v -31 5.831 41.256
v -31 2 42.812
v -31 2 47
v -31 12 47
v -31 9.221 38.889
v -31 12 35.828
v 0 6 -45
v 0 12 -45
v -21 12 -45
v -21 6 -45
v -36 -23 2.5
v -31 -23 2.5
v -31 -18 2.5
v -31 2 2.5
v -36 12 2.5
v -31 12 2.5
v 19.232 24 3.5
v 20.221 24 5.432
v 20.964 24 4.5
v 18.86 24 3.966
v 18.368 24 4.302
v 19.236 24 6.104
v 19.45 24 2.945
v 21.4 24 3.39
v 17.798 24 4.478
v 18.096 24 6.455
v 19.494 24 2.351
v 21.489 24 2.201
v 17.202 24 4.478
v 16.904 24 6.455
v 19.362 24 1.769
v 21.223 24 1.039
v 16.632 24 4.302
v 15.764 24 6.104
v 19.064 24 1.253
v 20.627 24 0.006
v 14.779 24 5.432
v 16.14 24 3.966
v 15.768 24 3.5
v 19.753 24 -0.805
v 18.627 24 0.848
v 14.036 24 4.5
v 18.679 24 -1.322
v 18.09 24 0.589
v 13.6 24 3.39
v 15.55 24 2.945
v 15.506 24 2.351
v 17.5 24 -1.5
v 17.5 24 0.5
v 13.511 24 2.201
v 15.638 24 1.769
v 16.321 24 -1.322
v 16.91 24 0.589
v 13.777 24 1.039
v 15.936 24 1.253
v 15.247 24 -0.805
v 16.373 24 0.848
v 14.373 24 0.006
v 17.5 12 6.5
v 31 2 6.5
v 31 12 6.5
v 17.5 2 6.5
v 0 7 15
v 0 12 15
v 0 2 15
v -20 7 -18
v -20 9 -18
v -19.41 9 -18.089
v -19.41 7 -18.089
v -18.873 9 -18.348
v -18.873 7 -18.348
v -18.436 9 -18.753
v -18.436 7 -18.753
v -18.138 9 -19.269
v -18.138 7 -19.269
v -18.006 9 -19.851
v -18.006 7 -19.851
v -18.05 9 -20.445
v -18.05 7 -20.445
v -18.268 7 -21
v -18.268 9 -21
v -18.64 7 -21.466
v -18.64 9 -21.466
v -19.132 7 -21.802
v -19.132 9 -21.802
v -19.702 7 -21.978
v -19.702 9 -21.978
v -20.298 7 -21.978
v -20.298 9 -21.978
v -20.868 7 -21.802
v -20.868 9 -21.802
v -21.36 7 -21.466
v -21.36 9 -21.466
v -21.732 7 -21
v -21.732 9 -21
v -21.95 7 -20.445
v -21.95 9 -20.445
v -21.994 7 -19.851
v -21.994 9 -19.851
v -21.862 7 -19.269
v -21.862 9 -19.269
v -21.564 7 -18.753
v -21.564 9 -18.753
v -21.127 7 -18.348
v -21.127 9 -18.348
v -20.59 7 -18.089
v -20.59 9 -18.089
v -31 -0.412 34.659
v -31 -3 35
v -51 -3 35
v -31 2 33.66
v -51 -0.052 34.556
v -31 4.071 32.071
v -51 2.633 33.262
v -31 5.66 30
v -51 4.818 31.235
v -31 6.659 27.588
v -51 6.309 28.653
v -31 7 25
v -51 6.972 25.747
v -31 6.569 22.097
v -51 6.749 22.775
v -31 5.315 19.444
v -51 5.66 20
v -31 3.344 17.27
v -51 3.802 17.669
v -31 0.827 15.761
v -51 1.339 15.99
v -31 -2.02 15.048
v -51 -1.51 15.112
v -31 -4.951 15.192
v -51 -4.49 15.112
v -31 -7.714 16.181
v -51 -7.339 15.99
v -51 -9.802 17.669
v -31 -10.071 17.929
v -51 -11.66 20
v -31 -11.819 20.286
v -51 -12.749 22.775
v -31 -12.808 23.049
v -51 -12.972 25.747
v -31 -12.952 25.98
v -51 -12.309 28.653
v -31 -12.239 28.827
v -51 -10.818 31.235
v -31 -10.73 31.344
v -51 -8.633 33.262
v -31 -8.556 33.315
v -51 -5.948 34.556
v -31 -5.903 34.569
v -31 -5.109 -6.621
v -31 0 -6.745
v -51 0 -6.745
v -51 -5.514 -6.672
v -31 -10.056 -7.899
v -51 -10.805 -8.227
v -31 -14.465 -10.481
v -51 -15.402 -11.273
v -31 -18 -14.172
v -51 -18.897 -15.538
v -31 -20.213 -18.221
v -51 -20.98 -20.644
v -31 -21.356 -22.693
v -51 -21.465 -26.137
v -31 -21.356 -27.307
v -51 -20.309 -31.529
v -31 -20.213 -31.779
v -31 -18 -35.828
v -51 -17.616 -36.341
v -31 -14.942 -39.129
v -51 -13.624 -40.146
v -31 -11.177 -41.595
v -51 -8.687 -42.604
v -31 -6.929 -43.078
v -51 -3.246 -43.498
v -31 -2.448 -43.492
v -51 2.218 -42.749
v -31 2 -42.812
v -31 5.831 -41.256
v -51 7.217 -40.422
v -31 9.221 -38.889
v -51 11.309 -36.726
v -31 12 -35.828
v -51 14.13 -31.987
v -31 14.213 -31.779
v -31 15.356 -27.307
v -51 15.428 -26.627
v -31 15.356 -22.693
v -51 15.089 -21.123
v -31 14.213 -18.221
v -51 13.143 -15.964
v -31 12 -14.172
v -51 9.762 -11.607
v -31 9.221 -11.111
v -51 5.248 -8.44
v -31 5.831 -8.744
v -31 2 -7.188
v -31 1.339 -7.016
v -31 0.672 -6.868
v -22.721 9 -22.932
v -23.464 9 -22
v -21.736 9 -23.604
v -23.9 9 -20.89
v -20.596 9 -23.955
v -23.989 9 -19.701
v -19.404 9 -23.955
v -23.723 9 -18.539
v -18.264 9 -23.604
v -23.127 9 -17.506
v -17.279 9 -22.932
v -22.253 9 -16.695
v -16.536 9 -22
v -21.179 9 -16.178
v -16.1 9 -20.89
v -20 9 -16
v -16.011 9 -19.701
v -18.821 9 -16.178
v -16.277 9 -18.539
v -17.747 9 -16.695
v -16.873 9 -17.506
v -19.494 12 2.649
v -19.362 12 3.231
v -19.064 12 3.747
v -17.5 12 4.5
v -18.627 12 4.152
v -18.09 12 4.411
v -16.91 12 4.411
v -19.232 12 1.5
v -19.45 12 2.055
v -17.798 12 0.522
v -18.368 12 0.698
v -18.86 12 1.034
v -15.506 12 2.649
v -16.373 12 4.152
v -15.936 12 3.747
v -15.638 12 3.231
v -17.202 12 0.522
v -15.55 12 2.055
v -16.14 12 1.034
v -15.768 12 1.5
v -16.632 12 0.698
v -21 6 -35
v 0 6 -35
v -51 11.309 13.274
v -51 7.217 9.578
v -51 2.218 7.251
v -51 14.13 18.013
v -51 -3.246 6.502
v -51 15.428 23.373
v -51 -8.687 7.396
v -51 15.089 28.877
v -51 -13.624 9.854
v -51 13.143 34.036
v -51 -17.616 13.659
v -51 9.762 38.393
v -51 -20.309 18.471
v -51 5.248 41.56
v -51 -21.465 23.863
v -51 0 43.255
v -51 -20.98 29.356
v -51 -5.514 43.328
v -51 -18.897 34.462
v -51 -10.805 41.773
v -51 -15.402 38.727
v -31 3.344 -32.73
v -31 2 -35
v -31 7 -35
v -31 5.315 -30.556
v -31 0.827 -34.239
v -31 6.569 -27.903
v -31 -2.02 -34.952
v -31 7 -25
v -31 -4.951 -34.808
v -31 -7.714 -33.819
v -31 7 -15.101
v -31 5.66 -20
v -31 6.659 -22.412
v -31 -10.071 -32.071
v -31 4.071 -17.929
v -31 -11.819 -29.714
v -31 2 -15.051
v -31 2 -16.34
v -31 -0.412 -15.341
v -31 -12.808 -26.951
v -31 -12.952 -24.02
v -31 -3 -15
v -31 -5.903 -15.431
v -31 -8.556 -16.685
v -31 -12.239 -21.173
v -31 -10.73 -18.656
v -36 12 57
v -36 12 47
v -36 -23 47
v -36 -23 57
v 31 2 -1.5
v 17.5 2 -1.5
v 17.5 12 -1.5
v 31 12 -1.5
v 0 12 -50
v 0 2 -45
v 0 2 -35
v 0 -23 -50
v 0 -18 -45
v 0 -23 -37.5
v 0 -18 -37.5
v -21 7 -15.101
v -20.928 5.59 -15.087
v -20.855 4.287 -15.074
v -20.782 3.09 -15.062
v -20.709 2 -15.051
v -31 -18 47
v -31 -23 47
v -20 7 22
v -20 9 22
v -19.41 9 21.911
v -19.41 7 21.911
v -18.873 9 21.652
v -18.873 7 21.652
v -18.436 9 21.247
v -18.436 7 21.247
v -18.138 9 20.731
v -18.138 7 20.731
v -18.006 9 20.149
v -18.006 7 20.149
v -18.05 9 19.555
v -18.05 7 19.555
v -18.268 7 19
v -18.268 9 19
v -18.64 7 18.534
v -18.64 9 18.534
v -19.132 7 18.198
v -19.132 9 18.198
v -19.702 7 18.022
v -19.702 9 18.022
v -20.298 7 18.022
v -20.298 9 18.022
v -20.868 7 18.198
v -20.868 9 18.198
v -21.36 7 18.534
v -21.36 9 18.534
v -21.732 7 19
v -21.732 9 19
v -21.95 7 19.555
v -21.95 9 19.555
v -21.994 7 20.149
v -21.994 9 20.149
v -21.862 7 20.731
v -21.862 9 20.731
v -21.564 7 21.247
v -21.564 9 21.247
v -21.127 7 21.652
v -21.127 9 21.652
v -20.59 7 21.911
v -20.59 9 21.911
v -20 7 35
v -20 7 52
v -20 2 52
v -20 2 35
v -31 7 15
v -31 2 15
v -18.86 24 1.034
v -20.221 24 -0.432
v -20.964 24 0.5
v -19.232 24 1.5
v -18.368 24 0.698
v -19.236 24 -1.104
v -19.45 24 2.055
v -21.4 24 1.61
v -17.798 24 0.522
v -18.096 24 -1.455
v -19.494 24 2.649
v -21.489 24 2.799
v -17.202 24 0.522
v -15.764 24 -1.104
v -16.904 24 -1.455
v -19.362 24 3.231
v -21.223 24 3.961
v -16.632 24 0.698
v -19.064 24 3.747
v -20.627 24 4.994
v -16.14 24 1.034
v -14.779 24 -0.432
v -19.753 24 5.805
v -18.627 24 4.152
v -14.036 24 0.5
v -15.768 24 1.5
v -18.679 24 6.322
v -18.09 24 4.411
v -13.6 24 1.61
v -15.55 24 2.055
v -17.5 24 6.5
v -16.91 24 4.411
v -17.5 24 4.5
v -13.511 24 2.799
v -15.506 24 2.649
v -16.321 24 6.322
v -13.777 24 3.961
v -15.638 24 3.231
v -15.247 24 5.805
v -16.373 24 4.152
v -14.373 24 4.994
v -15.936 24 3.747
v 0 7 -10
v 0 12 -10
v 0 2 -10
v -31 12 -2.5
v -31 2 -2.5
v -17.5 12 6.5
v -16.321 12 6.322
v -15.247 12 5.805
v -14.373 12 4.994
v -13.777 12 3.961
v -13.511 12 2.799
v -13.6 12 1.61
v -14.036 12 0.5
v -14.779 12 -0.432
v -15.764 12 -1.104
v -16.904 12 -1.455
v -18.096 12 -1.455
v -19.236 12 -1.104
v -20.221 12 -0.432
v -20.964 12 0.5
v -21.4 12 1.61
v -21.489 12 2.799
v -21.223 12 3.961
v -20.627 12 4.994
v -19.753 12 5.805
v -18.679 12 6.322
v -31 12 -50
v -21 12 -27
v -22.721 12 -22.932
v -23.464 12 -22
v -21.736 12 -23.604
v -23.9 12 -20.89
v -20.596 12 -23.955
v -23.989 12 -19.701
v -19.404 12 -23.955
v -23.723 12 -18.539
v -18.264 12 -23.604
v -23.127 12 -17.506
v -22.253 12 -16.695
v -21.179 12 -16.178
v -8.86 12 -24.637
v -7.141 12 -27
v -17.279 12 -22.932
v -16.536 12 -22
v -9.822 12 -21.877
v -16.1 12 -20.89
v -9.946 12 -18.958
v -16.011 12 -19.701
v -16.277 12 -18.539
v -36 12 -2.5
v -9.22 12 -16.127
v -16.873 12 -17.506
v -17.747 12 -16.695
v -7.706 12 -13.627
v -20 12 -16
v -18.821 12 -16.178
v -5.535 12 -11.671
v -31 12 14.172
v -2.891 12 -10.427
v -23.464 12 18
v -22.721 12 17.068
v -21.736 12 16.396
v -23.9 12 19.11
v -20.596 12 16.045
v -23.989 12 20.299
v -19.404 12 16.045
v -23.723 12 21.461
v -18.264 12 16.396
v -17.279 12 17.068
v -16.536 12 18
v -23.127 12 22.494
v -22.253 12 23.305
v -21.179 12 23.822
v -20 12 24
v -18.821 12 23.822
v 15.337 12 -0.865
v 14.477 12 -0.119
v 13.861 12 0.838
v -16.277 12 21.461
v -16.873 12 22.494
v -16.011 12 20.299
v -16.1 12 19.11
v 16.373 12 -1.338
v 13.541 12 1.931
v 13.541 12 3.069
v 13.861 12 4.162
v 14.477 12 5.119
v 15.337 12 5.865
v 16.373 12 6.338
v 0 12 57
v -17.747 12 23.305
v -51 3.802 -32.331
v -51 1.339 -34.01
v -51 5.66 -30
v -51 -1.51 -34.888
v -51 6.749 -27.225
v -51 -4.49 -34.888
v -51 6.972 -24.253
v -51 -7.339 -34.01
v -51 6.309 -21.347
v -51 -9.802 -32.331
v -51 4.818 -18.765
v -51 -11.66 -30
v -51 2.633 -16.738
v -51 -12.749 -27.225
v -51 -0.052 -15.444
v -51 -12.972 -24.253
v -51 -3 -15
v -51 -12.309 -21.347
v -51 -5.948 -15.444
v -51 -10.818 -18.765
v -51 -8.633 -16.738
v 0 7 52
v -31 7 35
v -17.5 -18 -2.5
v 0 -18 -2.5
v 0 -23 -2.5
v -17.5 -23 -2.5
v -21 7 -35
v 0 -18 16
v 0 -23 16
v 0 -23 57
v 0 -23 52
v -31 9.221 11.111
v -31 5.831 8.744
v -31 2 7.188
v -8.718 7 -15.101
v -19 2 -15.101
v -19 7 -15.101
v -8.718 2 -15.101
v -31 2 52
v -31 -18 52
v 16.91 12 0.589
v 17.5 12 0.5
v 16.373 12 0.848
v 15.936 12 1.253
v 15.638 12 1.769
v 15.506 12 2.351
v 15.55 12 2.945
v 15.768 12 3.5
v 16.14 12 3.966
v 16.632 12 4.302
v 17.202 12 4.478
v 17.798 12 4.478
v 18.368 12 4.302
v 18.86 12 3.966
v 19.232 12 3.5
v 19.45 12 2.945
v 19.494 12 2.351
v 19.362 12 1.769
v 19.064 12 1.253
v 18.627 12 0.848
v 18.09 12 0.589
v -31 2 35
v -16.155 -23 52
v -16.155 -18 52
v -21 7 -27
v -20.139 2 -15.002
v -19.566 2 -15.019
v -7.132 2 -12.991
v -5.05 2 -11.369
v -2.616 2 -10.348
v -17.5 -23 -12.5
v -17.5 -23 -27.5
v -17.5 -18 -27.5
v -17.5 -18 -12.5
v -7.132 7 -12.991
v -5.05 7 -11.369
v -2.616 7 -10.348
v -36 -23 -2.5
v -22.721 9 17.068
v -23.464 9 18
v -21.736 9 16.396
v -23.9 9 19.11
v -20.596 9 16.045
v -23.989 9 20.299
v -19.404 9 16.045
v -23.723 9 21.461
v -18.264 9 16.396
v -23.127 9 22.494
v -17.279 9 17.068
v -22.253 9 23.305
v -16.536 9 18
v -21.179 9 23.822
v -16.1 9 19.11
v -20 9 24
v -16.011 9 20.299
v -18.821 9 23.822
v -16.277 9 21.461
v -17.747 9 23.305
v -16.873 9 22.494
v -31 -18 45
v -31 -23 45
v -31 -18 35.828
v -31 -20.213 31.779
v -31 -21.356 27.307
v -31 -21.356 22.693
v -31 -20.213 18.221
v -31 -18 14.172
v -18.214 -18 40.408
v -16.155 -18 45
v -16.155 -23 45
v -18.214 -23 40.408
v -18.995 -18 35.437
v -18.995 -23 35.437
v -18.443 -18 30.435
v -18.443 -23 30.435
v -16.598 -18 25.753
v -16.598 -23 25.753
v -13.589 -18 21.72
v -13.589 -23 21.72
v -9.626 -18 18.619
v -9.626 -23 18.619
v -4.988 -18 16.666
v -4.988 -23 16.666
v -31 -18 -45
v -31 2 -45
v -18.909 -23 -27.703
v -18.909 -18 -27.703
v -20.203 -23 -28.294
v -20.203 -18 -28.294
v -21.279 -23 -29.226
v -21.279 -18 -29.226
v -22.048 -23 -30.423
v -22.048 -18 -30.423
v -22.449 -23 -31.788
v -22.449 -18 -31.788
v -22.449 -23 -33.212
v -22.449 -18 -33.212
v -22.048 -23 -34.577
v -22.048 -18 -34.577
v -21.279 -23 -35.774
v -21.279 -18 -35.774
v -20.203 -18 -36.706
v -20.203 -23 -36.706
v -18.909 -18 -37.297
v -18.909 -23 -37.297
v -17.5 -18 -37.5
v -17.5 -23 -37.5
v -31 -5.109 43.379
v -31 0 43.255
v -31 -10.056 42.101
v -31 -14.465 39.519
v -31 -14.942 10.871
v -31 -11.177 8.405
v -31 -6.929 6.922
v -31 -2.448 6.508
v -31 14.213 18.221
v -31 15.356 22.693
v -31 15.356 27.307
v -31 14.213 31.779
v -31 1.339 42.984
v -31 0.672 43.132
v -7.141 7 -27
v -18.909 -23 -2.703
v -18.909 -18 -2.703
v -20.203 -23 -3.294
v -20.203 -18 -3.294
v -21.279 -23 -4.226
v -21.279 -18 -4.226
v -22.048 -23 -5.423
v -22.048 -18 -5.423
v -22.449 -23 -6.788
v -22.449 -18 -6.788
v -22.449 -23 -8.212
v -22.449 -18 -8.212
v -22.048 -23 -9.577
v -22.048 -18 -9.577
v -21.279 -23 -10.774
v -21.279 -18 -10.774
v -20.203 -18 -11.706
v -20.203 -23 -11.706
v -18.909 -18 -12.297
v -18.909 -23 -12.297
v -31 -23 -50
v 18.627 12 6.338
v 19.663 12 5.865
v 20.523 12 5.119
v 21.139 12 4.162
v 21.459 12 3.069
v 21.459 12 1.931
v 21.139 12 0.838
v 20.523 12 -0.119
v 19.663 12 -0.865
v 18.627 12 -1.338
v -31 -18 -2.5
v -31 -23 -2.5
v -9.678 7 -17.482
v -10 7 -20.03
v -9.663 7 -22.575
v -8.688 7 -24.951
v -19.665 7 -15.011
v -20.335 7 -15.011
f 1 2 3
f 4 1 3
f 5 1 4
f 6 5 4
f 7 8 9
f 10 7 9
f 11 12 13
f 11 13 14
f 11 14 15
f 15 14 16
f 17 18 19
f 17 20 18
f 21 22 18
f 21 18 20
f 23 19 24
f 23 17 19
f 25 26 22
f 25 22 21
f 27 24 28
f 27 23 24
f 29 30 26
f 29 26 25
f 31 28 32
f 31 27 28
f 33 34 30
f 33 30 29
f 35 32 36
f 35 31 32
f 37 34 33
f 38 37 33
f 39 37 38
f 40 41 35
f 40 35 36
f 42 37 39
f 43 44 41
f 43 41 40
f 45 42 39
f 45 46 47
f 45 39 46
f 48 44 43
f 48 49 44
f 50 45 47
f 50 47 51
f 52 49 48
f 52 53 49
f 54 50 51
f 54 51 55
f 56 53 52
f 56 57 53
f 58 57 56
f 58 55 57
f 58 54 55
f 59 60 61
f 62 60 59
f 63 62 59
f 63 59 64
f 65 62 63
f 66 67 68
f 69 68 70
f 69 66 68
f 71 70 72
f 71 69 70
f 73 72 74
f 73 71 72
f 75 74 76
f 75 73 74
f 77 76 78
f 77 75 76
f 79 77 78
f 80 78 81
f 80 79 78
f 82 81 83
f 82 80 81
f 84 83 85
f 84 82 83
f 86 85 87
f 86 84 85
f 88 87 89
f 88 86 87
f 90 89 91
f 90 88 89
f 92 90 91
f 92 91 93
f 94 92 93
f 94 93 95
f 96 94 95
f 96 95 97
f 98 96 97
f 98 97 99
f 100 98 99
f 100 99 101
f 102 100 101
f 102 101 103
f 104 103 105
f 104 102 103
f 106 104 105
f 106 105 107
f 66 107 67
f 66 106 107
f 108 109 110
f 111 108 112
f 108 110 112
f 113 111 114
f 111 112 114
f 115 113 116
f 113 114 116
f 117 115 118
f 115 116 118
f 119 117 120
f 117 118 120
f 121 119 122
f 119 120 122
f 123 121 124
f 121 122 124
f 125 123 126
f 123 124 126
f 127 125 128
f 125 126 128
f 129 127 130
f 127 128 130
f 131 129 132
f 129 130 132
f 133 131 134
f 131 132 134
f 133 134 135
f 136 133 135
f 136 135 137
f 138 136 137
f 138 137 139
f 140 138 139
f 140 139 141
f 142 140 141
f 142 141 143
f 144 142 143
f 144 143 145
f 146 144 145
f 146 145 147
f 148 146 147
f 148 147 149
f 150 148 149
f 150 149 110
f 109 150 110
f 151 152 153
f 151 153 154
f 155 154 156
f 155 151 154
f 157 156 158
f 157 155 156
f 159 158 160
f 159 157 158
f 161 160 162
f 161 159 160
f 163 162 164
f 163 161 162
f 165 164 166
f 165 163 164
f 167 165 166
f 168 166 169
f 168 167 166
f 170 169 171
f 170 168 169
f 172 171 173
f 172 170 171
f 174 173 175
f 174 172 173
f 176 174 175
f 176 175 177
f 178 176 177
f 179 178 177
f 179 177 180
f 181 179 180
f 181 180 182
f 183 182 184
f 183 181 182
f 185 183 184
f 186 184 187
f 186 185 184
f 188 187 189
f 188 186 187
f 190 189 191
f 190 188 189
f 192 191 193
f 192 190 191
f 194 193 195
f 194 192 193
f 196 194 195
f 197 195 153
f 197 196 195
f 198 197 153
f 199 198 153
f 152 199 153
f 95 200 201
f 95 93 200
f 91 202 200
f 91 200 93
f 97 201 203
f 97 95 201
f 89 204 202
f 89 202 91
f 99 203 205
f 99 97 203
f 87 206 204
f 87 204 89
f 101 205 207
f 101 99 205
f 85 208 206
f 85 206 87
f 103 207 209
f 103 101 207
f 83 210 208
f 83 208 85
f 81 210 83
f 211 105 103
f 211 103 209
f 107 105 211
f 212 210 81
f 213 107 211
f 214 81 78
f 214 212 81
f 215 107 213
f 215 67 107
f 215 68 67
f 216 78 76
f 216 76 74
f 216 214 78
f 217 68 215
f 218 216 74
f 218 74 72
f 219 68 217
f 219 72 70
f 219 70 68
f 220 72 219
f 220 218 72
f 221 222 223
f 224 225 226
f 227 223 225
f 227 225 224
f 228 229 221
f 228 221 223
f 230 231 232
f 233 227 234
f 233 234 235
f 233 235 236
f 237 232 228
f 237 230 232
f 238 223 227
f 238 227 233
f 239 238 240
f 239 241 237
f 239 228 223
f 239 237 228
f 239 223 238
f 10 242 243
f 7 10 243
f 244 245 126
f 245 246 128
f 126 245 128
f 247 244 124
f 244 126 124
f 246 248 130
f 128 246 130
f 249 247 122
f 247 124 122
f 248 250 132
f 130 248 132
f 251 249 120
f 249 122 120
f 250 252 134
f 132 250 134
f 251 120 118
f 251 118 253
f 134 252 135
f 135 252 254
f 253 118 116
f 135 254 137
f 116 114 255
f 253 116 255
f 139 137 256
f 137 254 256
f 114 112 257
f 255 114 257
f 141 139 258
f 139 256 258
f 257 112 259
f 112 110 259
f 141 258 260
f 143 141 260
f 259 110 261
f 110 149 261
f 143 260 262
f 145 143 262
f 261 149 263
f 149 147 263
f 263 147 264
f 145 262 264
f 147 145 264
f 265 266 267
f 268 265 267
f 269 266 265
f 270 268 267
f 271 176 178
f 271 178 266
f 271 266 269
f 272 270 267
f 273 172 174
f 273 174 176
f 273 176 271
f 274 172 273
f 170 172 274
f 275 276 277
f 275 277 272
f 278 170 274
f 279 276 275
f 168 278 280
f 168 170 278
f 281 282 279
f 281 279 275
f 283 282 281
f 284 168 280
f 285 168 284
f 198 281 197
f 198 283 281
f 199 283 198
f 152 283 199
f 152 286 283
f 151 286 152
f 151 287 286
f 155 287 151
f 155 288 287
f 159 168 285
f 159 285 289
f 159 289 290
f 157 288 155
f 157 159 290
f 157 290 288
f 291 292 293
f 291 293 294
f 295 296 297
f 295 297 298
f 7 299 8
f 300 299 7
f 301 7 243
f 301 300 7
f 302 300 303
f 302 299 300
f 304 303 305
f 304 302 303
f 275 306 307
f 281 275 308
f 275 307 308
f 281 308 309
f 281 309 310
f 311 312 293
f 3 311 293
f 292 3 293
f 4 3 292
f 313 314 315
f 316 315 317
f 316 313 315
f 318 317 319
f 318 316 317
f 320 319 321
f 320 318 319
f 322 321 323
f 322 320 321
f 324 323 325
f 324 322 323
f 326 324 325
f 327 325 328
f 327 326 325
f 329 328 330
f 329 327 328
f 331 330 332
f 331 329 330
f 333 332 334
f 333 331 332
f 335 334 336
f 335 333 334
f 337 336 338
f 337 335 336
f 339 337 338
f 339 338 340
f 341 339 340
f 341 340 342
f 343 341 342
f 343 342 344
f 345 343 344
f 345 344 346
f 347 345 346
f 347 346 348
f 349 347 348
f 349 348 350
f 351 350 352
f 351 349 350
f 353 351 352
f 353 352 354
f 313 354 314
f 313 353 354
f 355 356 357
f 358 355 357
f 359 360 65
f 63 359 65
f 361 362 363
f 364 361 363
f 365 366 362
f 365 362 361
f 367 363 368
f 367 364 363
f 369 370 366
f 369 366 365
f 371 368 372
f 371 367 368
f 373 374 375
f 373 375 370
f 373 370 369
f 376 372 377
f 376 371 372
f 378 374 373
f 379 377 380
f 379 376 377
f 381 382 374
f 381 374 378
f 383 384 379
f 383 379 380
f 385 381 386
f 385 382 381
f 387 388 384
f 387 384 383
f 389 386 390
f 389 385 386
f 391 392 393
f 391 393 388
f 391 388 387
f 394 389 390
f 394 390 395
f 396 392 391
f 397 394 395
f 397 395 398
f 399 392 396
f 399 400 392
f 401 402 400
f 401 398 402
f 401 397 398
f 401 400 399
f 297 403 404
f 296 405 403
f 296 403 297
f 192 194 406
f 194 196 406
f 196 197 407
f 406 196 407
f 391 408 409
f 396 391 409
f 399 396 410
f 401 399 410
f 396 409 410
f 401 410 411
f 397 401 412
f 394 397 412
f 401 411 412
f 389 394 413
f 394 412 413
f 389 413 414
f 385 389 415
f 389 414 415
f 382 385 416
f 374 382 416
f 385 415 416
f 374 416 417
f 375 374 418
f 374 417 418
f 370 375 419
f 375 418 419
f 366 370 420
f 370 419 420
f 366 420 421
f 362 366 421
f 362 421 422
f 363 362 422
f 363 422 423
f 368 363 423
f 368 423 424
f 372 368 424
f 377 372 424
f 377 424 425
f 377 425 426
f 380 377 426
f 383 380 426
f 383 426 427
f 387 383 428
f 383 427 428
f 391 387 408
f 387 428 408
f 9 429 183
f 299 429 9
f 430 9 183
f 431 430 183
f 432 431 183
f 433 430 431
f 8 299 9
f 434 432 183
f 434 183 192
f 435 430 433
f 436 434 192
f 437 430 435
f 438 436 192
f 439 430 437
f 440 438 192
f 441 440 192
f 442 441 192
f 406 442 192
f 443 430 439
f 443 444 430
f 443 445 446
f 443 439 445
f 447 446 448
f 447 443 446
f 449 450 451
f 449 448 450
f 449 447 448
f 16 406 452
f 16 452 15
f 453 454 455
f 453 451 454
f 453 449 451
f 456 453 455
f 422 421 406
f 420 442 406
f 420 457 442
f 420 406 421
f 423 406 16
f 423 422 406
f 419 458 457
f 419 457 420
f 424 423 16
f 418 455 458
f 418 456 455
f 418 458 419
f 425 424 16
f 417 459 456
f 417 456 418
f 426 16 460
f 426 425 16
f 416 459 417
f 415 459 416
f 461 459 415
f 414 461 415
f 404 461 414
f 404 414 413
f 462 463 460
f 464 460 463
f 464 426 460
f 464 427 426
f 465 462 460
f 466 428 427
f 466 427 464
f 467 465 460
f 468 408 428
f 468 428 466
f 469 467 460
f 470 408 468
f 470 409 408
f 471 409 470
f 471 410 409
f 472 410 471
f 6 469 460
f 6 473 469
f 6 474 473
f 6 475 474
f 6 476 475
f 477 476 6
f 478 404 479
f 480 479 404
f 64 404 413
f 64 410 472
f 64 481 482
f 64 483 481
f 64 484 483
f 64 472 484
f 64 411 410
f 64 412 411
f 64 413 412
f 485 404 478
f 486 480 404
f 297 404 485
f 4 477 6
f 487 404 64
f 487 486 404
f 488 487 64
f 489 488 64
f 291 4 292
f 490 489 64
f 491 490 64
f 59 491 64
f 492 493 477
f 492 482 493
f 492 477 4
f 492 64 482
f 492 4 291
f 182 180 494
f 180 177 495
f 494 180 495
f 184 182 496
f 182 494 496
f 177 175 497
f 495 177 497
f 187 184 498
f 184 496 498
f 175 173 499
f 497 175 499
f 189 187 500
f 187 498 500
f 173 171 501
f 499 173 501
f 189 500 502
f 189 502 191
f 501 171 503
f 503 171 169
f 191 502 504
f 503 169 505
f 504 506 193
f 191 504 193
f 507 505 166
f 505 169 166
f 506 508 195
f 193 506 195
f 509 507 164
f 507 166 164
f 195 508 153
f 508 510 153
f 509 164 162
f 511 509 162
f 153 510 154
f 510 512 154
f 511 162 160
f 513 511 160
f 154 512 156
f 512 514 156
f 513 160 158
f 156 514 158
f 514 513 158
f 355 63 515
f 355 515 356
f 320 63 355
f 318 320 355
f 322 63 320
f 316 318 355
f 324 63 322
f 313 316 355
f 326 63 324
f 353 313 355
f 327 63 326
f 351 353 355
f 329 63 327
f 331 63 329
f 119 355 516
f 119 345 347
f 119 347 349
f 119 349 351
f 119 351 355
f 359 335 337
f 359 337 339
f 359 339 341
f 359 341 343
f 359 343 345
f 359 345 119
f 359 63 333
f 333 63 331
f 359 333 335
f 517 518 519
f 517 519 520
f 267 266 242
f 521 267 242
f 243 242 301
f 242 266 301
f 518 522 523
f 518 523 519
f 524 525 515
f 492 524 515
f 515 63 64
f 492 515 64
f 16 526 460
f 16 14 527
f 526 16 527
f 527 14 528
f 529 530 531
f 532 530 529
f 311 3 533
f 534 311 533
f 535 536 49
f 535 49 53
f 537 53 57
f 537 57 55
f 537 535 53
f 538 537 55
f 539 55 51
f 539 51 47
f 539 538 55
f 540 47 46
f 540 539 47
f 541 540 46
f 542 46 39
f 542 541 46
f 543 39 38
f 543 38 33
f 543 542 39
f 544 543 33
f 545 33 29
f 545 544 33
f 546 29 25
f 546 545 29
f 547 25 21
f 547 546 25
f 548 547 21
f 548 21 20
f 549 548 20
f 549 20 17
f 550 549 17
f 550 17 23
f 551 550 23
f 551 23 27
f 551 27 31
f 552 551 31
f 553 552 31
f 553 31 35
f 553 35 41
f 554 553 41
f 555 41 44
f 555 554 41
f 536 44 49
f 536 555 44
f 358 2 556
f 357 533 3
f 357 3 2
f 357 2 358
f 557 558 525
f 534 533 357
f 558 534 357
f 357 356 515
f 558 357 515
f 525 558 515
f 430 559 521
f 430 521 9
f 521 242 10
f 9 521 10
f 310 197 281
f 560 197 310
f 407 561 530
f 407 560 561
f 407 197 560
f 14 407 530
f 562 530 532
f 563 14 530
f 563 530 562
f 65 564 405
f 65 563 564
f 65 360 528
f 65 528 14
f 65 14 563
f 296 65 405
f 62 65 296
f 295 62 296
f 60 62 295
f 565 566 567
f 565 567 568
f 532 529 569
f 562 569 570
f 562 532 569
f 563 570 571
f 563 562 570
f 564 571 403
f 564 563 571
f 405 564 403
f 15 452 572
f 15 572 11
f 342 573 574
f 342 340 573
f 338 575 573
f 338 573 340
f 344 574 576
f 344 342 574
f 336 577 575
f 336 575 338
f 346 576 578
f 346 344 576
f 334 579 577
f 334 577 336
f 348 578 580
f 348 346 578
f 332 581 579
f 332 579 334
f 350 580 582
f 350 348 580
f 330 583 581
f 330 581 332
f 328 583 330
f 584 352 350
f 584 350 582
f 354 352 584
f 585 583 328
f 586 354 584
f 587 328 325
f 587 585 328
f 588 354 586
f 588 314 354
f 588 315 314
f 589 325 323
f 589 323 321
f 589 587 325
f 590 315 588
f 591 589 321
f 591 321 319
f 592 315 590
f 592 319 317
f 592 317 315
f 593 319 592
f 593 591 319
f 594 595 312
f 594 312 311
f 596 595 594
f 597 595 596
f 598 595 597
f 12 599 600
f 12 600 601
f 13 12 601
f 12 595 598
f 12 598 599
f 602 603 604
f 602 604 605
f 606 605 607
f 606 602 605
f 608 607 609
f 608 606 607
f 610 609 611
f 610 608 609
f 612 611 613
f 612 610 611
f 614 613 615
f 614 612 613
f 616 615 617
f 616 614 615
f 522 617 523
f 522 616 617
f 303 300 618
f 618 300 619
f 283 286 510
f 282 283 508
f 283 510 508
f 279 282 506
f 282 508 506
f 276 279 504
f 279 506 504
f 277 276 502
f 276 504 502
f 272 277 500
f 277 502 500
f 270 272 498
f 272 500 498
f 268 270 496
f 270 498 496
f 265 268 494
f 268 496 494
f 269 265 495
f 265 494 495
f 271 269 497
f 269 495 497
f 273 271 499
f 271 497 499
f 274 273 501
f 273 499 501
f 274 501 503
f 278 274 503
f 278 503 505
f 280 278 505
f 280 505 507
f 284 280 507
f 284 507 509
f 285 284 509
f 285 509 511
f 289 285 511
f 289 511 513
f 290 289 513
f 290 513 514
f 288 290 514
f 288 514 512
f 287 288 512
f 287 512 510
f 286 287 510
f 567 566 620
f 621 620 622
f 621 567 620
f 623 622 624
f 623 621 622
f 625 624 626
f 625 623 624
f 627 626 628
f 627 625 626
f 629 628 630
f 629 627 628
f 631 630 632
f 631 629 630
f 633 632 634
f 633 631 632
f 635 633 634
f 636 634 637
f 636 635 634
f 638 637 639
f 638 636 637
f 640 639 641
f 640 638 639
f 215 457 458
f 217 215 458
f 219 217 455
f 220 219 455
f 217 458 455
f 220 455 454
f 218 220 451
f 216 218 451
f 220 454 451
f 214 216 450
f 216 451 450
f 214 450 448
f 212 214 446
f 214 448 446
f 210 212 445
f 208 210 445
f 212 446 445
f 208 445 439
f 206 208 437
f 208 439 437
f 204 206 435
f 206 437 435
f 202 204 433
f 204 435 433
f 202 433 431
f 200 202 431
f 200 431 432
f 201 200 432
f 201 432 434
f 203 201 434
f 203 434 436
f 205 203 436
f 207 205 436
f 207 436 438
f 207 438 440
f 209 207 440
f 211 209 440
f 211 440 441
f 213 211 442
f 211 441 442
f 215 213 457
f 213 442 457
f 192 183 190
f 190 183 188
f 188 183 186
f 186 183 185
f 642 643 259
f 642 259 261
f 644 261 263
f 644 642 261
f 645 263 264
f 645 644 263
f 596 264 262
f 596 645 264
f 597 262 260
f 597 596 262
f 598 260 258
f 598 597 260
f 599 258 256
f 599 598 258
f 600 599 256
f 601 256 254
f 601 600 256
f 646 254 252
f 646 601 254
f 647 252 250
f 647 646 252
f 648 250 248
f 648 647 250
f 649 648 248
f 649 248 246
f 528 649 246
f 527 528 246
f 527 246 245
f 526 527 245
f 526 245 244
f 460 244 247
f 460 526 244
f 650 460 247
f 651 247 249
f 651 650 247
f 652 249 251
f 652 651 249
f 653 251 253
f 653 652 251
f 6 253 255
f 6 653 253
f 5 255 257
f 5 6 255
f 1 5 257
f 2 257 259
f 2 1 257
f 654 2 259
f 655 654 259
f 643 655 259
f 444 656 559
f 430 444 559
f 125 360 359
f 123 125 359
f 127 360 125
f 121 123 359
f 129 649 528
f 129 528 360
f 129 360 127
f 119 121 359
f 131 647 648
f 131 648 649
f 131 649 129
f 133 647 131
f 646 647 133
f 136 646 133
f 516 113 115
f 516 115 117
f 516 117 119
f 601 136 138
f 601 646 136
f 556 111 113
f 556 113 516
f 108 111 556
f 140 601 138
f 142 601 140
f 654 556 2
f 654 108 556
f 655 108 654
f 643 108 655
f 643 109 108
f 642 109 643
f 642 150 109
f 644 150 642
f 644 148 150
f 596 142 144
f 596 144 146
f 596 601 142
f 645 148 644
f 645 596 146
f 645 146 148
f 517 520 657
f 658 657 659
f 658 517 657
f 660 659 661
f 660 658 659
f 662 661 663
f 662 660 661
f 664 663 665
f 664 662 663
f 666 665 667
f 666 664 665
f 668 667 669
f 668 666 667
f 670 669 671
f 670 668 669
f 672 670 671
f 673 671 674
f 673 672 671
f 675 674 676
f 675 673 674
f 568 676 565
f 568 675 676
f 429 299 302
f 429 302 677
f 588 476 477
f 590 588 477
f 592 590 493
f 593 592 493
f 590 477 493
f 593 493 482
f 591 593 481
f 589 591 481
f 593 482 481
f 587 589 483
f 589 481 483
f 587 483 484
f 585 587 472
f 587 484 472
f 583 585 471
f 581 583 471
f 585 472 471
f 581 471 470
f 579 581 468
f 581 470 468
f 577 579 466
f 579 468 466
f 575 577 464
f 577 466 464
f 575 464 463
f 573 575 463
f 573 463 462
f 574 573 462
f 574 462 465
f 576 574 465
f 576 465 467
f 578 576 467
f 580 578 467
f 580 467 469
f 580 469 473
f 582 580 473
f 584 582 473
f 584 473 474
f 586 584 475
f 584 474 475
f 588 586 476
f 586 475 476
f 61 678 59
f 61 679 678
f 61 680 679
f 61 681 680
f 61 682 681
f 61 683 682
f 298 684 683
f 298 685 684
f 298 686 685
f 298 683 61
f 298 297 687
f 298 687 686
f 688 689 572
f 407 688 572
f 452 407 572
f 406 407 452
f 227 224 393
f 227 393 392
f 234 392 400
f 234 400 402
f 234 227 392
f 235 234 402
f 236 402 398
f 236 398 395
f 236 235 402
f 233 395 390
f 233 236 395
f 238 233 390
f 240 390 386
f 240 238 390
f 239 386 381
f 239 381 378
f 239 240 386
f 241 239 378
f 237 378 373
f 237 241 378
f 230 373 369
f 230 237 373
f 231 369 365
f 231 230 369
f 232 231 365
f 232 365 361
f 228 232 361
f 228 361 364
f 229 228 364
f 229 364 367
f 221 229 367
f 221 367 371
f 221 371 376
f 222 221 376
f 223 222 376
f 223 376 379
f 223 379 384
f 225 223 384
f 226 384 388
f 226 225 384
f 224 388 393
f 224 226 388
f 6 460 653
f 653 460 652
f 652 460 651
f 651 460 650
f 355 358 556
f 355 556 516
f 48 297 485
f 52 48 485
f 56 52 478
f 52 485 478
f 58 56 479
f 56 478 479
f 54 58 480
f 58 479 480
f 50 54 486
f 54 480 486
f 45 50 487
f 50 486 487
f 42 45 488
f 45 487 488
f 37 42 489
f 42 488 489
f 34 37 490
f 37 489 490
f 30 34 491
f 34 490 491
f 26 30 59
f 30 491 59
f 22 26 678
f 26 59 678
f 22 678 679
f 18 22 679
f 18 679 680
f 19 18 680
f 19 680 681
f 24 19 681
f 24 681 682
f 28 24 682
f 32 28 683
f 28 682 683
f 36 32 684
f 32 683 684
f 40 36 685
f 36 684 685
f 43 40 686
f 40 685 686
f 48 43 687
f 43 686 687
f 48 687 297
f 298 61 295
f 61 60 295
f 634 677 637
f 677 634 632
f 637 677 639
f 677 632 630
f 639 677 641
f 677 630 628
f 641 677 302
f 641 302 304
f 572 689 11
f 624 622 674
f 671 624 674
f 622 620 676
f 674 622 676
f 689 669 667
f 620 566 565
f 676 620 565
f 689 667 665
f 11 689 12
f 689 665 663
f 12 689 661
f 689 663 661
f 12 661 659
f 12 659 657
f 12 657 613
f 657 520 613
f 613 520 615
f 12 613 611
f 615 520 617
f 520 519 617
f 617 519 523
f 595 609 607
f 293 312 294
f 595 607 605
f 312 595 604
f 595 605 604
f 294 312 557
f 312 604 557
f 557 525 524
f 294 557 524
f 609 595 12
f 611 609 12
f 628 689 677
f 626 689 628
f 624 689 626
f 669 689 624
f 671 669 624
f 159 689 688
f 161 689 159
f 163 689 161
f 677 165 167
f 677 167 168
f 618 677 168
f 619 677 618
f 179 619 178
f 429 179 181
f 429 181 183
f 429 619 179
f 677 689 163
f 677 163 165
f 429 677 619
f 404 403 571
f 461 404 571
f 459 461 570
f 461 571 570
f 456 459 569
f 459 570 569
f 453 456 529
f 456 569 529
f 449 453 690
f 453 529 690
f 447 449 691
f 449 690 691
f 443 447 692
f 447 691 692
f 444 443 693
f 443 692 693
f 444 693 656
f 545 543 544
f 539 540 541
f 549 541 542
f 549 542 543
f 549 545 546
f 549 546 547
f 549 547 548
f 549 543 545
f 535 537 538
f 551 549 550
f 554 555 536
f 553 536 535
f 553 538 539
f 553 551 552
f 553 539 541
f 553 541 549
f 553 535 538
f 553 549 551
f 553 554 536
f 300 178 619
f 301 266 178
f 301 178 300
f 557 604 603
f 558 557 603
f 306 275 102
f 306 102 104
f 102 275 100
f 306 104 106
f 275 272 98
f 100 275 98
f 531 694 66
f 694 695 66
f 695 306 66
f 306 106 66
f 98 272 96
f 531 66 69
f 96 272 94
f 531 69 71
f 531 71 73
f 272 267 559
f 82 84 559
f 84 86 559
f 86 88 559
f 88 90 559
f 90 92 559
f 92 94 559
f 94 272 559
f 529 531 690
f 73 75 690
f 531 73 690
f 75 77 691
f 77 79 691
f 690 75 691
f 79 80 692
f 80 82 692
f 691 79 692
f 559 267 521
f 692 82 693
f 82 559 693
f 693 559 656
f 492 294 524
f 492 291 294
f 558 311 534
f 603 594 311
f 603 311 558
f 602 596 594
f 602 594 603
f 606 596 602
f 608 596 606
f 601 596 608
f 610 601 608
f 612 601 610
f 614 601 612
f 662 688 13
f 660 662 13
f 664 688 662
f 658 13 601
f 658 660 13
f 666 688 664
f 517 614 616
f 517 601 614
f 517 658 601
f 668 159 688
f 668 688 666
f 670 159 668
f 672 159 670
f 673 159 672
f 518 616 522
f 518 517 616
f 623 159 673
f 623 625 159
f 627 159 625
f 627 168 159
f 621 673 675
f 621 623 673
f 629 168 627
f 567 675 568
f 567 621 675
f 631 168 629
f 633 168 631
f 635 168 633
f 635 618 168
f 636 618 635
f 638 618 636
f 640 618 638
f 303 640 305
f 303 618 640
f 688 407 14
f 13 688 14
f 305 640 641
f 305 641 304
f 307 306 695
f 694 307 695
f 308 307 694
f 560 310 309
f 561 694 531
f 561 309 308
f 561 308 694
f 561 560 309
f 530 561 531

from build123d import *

# Parameters (mm, degrees)
SKETCH_1_W               = 62
SKETCH_1_H               = 90
SKETCH_1_R               = 5
SKETCH_1_R_2             = 10
EXTRUDE_1_DEPTH          = 7
SKETCH_3_R               = 10
SKETCH_3_R_2             = 5
EXTRUDE_2_DEPTH          = 7
SKETCH_4_R               = 18.5
EXTRUDE_3_DEPTH          = 20
SKETCH_5_W               = 42
SKETCH_5_H               = 18
CUT_EXTRUDE_1_DEPTH      = 7
SKETCH_7_R               = 2
EXTRUDE_5_DEPTH          = 5
SKETCH_6_R               = 4
SKETCH_6_R_2             = 2
EXTRUDE_7_DEPTH          = 12
SKETCH_18_R              = 4
CUT_EXTRUDE_8_DEPTH      = 3
CUT_EXTRUDE_3_DEPTH      = 73.124891681
CUT_EXTRUDE_3_DEPTH_BACK = 73.124891681
SKETCH_10_W              = 13.858571571
SKETCH_10_H              = 11.898979486
SKETCH_10_W_2            = 20
SKETCH_10_H_2            = 30
CUT_EXTRUDE_4_DEPTH      = 7
SKETCH_11_W              = 17.5
SKETCH_11_H              = 10
CUT_EXTRUDE_5_DEPTH      = 7
CUT_EXTRUDE_9_REACH      = 84.674
SKETCH_19_W              = 10.885621722
SKETCH_19_H              = 15
SKETCH_12_W              = 92.977348864
SKETCH_12_H              = 90
CUT_EXTRUDE_6_DEPTH      = 2
SKETCH_13_W              = 67.267412259
SKETCH_13_H              = 90
CUT_EXTRUDE_7_DEPTH      = 2
SKETCH_14_W              = 31
SKETCH_14_H              = 35
EXTRUDE_8_DEPTH          = 5
SKETCH_15_W              = 14.844505579
SKETCH_15_H              = 5
EXTRUDE_9_DEPTH          = 7
SKETCH_16_W              = 31
SKETCH_16_H              = 35
EXTRUDE_10_DEPTH         = 5
SKETCH_20_W              = 21
SKETCH_20_H              = 10
EXTRUDE_11_DEPTH         = 4
SKETCH_21_W              = 5
SKETCH_21_H              = 35
SKETCH_21_W_2            = 10
EXTRUDE_12_DEPTH         = 5
SKETCH_22_R              = 10
CUT_EXTRUDE_10_DEPTH     = 103.708324882
SKETCH_23_W              = 20
SKETCH_23_H              = 10
CUT_EXTRUDE_11_DEPTH     = 11


with BuildPart() as part:
    # 草图1 → 凸台-拉伸1 (new body)
    with BuildSketch(Plane(origin=(0, 0, 0), x_dir=(1, 0, 0), z_dir=(0, 1, 0))):
        Rectangle(SKETCH_1_W, SKETCH_1_H)
        with Locations(Location((-20, 20, 0), (0, 0, 270))):
            Circle(SKETCH_1_R, mode=Mode.SUBTRACT)
        with Locations(Location((20, 20, 0), (0, 0, 270))):
            Circle(SKETCH_1_R, mode=Mode.SUBTRACT)
        with Locations(Location((20, -20, 0), (0, 0, 270))):
            Circle(SKETCH_1_R, mode=Mode.SUBTRACT)
        with Locations(Location((-20, -20, 0), (0, 0, 270))):
            Circle(SKETCH_1_R, mode=Mode.SUBTRACT)
        with Locations(Location((0, 20, 0), (0, 0, 270))):
            Circle(SKETCH_1_R_2, mode=Mode.SUBTRACT)
    extrude(amount=EXTRUDE_1_DEPTH)



with BuildPart() as body_2:
    # 草图3 → 凸台-拉伸2 (new body)
    with BuildSketch(Plane(origin=(0, -16, 0), x_dir=(-1, 0, 0), z_dir=(0, -1, 0))):
        with BuildLine():
            Line((-31, 45), (31, 45))
            Line((31, 45), (31, -45))
            Line((31, -45), (16.155494421, -45))
            ThreePointArc((16.155494421, -45), (0, -16), (-16.155494421, -45))
            Line((-16.155494421, -45), (-31, -45))
            Line((-31, -45), (-31, 45))
        make_face()
        with Locations(Location((0, 20, 0), (0, 0, 270))):
            Circle(SKETCH_3_R, mode=Mode.SUBTRACT)
        with Locations(Location((17.5, 32.5, 0), (0, 0, 90))):
            Circle(SKETCH_3_R_2, mode=Mode.SUBTRACT)
        with Locations(Location((17.5, 7.5, 0), (0, 0, 90))):
            Circle(SKETCH_3_R_2, mode=Mode.SUBTRACT)
        with Locations(Location((-17.5, 7.5, 0), (0, 0, 90))):
            Circle(SKETCH_3_R_2, mode=Mode.SUBTRACT)
        with Locations(Location((-17.5, 32.5, 0), (0, 0, 90))):
            Circle(SKETCH_3_R_2, mode=Mode.SUBTRACT)
    extrude(amount=EXTRUDE_2_DEPTH)


with BuildPart() as part_1:
    add(part.part)

    add(body_2.part)  # 凸台-拉伸3 merges body 2
    # 草图4 → 凸台-拉伸3 (add)
    with BuildSketch(Plane(origin=(31, 0, 0), x_dir=(0, 0, -1), z_dir=(1, 0, 0))):
        with Locations(Location((-25, -3, 0), (0, 0, 170.667581816))):
            Circle(SKETCH_4_R)
        with Locations(Location((25, -3, 0), (0, 0, 170.667581816))):
            Circle(SKETCH_4_R)
    extrude_3 = extrude(amount=EXTRUDE_3_DEPTH)

    # 镜向1: 凸台-拉伸3 across plane
    add(extrude_3.mirror(Plane(origin=(0, 0, 0), x_dir=(0, 0, 1), z_dir=(1, 0, 0))))

    # 草图5 → 切除-拉伸1 (cut)
    with BuildSketch(Plane(origin=(0, 7, 0), x_dir=(1, 0, 0), z_dir=(0, 1, 0))):
        with Locations((0, 36)):
            Rectangle(SKETCH_5_W, SKETCH_5_H)
    extrude(amount=-CUT_EXTRUDE_1_DEPTH, mode=Mode.SUBTRACT)

    # 草图7 → 凸台-拉伸5 (add)
    with BuildSketch(Plane(origin=(0, 7, 0), x_dir=(1, 0, 0), z_dir=(0, 1, 0))):
        with BuildLine():
            Line((-7.141428429, 27), (-21, 27))
            Line((-21, 27), (-21, 45))
            Line((-21, 45), (-31, 45))
            Line((-31, 45), (-31, -45))
            Line((-31, -45), (31, -45))
            Line((31, -45), (31, 45))
            Line((31, 45), (21, 45))
            Line((21, 45), (21, 27))
            Line((21, 27), (7.141428429, 27))
            ThreePointArc((7.141428429, 27), (0, 10), (-7.141428429, 27))
        make_face()
        with Locations(Location((-20, 20, 0), (0, 0, 270))):
            Circle(SKETCH_7_R, mode=Mode.SUBTRACT)
        with Locations(Location((20, 20, 0), (0, 0, 270))):
            Circle(SKETCH_7_R, mode=Mode.SUBTRACT)
        with Locations(Location((20, -20, 0), (0, 0, 270))):
            Circle(SKETCH_7_R, mode=Mode.SUBTRACT)
        with Locations(Location((-20, -20, 0), (0, 0, 270))):
            Circle(SKETCH_7_R, mode=Mode.SUBTRACT)
    extrude(amount=EXTRUDE_5_DEPTH)

    # 草图6 → 凸台-拉伸7 (add)
    # profile 1 of 2: a face of its own
    with BuildSketch(Plane(origin=(0, 12, 0), x_dir=(1, 0, 0), z_dir=(0, 1, 0))):
        with Locations(Location((-17.5, -2.5, 0), (0, 0, 270))):
            Circle(SKETCH_6_R)
        with Locations(Location((-17.5, -2.5, 0), (0, 0, 270))):
            Circle(SKETCH_6_R_2, mode=Mode.SUBTRACT)
    # profile 2 of 2: a face of its own
    with BuildSketch(Plane(origin=(0, 12, 0), x_dir=(1, 0, 0), z_dir=(0, 1, 0))):
        with Locations(Location((17.5, -2.5, 0), (0, 0, 90))):
            Circle(SKETCH_6_R)
        with Locations(Location((17.5, -2.5, 0), (0, 0, 90))):
            Circle(SKETCH_6_R_2, mode=Mode.SUBTRACT)
    extrude(amount=EXTRUDE_7_DEPTH)

    # 草图18 → 切除-拉伸8 (cut)
    with BuildSketch(Plane(origin=(0, 12, 0), x_dir=(1, 0, 0), z_dir=(0, 1, 0))):
        with Locations(Location((-20, 20, 0), (0, 0, 270))):
            Circle(SKETCH_18_R)
        with Locations(Location((20, 20, 0), (0, 0, 270))):
            Circle(SKETCH_18_R)
        with Locations(Location((20, -20, 0), (0, 0, 270))):
            Circle(SKETCH_18_R)
        with Locations(Location((-20, -20, 0), (0, 0, 270))):
            Circle(SKETCH_18_R)
    extrude(amount=-CUT_EXTRUDE_8_DEPTH, mode=Mode.SUBTRACT)

    # 草图9 → 切除-拉伸3 (cut, two sides: drawn at the far end of the back side and taken through both)
    with BuildSketch(Plane(origin=(0, 0, 0), x_dir=(1, 0, 0), z_dir=(0, 1, 0)).offset(-CUT_EXTRUDE_3_DEPTH_BACK)):
        Polygon((58.168962293, 1.5), (58.168962293, 54.540507165), (0, 54.540507165), (0, 10), (17.5, 1.5), align=None)
        Polygon((0, -53.302122896), (58.168962293, -53.302122896), (58.168962293, -6.5), (17.5, -6.5), (0, -15), align=None)
    extrude(amount=CUT_EXTRUDE_3_DEPTH + CUT_EXTRUDE_3_DEPTH_BACK, mode=Mode.SUBTRACT)

    # 草图10 → 切除-拉伸4 (cut)
    with BuildSketch(Plane(origin=(0, 0, 0), x_dir=(1, 0, 0), z_dir=(0, 1, 0))):
        with Locations((-14.070714215, 21.050510257)):
            Rectangle(SKETCH_10_W, SKETCH_10_H)
        with Locations((-10, -30)):
            Rectangle(SKETCH_10_W_2, SKETCH_10_H_2)
    extrude(amount=CUT_EXTRUDE_4_DEPTH, mode=Mode.SUBTRACT)

    # 草图11 → 切除-拉伸5 (cut)
    with BuildSketch(Plane(origin=(0, -16, 0), x_dir=(1, 0, 0), z_dir=(0, 1, 0))):
        with Locations((-8.75, 32.5)):
            Rectangle(SKETCH_11_W, SKETCH_11_H)
        Polygon((-17.5, 12.5), (32.655458142, 12.5), (32.655458142, -18.188768946), (0, -18.188768946), (0, 2.5), (-17.5, 2.5), align=None)
    extrude(amount=-CUT_EXTRUDE_5_DEPTH, mode=Mode.SUBTRACT)

    # 草图19 → 切除-拉伸9 (cut, up to next)
    with BuildSketch(Plane.XZ.offset(23), mode=Mode.PRIVATE) as cut_extrude_9_sk1:
        with Locations((-12.057189139, -20)):
            Rectangle(SKETCH_19_W, SKETCH_19_H)
    cut_extrude_9_tool1 = extrude(cut_extrude_9_sk1.sketch, amount=-CUT_EXTRUDE_9_REACH, mode=Mode.PRIVATE) & part_1.part
    add(cut_extrude_9_tool1.solids().sort_by_distance((-12.057189, -23, -20))[0], mode=Mode.SUBTRACT)

    # 草图12 → 切除-拉伸6 (cut)
    with BuildSketch(Plane.XZ):
        with Locations((15.488674432, 0)):
            Rectangle(SKETCH_12_W, SKETCH_12_H)
    extrude(amount=-CUT_EXTRUDE_6_DEPTH, mode=Mode.SUBTRACT)

    # 草图13 → 切除-拉伸7 (cut)
    with BuildSketch(Plane(origin=(0, -16, 0), x_dir=(1, 0, 0), z_dir=(0, 1, 0))):
        with Locations((2.63370613, 0)):
            Rectangle(SKETCH_13_W, SKETCH_13_H)
    extrude(amount=-CUT_EXTRUDE_7_DEPTH, mode=Mode.SUBTRACT)

    # 草图14 → 凸台-拉伸8 (add)
    with BuildSketch(Plane(origin=(0, 0, -45), x_dir=(-1, 0, 0), z_dir=(0, 0, -1))):
        with Locations((15.5, -5.5)):
            Rectangle(SKETCH_14_W, SKETCH_14_H)
    extrude(amount=EXTRUDE_8_DEPTH)

    # 草图15 → 凸台-拉伸9 (add)
    with BuildSketch(Plane.XY.offset(45)):
        Polygon((0, 12), (0, 7), (-20, 7), (-20, 2), (-31, 2), (-31, 12), align=None)
        with Locations((-23.577747211, -20.5)):
            Rectangle(SKETCH_15_W, SKETCH_15_H)
    extrude(amount=EXTRUDE_9_DEPTH)

    # 草图16 → 凸台-拉伸10 (add)
    with BuildSketch(Plane.XY.offset(52)):
        with Locations((-15.5, -5.5)):
            Rectangle(SKETCH_16_W, SKETCH_16_H)
    extrude(amount=EXTRUDE_10_DEPTH)

    # 草图20 → 凸台-拉伸11 (add)
    with BuildSketch(Plane.XZ.offset(-2)):
        with Locations((-10.5, -40)):
            Rectangle(SKETCH_20_W, SKETCH_20_H)
    extrude(amount=-EXTRUDE_11_DEPTH)

    # 草图21 → 凸台-拉伸12 (add)
    with BuildSketch(Plane.ZY.offset(31)):
        with Locations((0, -5.5)):
            Rectangle(SKETCH_21_W, SKETCH_21_H)
        with Locations((52, -5.5)):
            Rectangle(SKETCH_21_W_2, SKETCH_21_H)
    extrude(amount=EXTRUDE_12_DEPTH)

    # 草图22 → 切除-拉伸10 (cut, through all)
    with BuildSketch(Plane.ZY.offset(51)):
        with Locations((-25, -3)):
            Circle(SKETCH_22_R)
        with Locations((25, -3)):
            Circle(SKETCH_22_R)
    extrude(amount=-CUT_EXTRUDE_10_DEPTH, mode=Mode.SUBTRACT)

    # 草图23 → 切除-拉伸11 (cut)
    with BuildSketch(Plane(origin=(-20, 0, 0), x_dir=(0, 0, -1), z_dir=(1, 0, 0))):
        with Locations((-25, 2)):
            Rectangle(SKETCH_23_W, SKETCH_23_H)
        Polygon((15, -3), (35, -3), (35, 7), (15.101020514, 7), align=None)
    extrude(amount=-CUT_EXTRUDE_11_DEPTH, mode=Mode.SUBTRACT)


solid = part_1.part
